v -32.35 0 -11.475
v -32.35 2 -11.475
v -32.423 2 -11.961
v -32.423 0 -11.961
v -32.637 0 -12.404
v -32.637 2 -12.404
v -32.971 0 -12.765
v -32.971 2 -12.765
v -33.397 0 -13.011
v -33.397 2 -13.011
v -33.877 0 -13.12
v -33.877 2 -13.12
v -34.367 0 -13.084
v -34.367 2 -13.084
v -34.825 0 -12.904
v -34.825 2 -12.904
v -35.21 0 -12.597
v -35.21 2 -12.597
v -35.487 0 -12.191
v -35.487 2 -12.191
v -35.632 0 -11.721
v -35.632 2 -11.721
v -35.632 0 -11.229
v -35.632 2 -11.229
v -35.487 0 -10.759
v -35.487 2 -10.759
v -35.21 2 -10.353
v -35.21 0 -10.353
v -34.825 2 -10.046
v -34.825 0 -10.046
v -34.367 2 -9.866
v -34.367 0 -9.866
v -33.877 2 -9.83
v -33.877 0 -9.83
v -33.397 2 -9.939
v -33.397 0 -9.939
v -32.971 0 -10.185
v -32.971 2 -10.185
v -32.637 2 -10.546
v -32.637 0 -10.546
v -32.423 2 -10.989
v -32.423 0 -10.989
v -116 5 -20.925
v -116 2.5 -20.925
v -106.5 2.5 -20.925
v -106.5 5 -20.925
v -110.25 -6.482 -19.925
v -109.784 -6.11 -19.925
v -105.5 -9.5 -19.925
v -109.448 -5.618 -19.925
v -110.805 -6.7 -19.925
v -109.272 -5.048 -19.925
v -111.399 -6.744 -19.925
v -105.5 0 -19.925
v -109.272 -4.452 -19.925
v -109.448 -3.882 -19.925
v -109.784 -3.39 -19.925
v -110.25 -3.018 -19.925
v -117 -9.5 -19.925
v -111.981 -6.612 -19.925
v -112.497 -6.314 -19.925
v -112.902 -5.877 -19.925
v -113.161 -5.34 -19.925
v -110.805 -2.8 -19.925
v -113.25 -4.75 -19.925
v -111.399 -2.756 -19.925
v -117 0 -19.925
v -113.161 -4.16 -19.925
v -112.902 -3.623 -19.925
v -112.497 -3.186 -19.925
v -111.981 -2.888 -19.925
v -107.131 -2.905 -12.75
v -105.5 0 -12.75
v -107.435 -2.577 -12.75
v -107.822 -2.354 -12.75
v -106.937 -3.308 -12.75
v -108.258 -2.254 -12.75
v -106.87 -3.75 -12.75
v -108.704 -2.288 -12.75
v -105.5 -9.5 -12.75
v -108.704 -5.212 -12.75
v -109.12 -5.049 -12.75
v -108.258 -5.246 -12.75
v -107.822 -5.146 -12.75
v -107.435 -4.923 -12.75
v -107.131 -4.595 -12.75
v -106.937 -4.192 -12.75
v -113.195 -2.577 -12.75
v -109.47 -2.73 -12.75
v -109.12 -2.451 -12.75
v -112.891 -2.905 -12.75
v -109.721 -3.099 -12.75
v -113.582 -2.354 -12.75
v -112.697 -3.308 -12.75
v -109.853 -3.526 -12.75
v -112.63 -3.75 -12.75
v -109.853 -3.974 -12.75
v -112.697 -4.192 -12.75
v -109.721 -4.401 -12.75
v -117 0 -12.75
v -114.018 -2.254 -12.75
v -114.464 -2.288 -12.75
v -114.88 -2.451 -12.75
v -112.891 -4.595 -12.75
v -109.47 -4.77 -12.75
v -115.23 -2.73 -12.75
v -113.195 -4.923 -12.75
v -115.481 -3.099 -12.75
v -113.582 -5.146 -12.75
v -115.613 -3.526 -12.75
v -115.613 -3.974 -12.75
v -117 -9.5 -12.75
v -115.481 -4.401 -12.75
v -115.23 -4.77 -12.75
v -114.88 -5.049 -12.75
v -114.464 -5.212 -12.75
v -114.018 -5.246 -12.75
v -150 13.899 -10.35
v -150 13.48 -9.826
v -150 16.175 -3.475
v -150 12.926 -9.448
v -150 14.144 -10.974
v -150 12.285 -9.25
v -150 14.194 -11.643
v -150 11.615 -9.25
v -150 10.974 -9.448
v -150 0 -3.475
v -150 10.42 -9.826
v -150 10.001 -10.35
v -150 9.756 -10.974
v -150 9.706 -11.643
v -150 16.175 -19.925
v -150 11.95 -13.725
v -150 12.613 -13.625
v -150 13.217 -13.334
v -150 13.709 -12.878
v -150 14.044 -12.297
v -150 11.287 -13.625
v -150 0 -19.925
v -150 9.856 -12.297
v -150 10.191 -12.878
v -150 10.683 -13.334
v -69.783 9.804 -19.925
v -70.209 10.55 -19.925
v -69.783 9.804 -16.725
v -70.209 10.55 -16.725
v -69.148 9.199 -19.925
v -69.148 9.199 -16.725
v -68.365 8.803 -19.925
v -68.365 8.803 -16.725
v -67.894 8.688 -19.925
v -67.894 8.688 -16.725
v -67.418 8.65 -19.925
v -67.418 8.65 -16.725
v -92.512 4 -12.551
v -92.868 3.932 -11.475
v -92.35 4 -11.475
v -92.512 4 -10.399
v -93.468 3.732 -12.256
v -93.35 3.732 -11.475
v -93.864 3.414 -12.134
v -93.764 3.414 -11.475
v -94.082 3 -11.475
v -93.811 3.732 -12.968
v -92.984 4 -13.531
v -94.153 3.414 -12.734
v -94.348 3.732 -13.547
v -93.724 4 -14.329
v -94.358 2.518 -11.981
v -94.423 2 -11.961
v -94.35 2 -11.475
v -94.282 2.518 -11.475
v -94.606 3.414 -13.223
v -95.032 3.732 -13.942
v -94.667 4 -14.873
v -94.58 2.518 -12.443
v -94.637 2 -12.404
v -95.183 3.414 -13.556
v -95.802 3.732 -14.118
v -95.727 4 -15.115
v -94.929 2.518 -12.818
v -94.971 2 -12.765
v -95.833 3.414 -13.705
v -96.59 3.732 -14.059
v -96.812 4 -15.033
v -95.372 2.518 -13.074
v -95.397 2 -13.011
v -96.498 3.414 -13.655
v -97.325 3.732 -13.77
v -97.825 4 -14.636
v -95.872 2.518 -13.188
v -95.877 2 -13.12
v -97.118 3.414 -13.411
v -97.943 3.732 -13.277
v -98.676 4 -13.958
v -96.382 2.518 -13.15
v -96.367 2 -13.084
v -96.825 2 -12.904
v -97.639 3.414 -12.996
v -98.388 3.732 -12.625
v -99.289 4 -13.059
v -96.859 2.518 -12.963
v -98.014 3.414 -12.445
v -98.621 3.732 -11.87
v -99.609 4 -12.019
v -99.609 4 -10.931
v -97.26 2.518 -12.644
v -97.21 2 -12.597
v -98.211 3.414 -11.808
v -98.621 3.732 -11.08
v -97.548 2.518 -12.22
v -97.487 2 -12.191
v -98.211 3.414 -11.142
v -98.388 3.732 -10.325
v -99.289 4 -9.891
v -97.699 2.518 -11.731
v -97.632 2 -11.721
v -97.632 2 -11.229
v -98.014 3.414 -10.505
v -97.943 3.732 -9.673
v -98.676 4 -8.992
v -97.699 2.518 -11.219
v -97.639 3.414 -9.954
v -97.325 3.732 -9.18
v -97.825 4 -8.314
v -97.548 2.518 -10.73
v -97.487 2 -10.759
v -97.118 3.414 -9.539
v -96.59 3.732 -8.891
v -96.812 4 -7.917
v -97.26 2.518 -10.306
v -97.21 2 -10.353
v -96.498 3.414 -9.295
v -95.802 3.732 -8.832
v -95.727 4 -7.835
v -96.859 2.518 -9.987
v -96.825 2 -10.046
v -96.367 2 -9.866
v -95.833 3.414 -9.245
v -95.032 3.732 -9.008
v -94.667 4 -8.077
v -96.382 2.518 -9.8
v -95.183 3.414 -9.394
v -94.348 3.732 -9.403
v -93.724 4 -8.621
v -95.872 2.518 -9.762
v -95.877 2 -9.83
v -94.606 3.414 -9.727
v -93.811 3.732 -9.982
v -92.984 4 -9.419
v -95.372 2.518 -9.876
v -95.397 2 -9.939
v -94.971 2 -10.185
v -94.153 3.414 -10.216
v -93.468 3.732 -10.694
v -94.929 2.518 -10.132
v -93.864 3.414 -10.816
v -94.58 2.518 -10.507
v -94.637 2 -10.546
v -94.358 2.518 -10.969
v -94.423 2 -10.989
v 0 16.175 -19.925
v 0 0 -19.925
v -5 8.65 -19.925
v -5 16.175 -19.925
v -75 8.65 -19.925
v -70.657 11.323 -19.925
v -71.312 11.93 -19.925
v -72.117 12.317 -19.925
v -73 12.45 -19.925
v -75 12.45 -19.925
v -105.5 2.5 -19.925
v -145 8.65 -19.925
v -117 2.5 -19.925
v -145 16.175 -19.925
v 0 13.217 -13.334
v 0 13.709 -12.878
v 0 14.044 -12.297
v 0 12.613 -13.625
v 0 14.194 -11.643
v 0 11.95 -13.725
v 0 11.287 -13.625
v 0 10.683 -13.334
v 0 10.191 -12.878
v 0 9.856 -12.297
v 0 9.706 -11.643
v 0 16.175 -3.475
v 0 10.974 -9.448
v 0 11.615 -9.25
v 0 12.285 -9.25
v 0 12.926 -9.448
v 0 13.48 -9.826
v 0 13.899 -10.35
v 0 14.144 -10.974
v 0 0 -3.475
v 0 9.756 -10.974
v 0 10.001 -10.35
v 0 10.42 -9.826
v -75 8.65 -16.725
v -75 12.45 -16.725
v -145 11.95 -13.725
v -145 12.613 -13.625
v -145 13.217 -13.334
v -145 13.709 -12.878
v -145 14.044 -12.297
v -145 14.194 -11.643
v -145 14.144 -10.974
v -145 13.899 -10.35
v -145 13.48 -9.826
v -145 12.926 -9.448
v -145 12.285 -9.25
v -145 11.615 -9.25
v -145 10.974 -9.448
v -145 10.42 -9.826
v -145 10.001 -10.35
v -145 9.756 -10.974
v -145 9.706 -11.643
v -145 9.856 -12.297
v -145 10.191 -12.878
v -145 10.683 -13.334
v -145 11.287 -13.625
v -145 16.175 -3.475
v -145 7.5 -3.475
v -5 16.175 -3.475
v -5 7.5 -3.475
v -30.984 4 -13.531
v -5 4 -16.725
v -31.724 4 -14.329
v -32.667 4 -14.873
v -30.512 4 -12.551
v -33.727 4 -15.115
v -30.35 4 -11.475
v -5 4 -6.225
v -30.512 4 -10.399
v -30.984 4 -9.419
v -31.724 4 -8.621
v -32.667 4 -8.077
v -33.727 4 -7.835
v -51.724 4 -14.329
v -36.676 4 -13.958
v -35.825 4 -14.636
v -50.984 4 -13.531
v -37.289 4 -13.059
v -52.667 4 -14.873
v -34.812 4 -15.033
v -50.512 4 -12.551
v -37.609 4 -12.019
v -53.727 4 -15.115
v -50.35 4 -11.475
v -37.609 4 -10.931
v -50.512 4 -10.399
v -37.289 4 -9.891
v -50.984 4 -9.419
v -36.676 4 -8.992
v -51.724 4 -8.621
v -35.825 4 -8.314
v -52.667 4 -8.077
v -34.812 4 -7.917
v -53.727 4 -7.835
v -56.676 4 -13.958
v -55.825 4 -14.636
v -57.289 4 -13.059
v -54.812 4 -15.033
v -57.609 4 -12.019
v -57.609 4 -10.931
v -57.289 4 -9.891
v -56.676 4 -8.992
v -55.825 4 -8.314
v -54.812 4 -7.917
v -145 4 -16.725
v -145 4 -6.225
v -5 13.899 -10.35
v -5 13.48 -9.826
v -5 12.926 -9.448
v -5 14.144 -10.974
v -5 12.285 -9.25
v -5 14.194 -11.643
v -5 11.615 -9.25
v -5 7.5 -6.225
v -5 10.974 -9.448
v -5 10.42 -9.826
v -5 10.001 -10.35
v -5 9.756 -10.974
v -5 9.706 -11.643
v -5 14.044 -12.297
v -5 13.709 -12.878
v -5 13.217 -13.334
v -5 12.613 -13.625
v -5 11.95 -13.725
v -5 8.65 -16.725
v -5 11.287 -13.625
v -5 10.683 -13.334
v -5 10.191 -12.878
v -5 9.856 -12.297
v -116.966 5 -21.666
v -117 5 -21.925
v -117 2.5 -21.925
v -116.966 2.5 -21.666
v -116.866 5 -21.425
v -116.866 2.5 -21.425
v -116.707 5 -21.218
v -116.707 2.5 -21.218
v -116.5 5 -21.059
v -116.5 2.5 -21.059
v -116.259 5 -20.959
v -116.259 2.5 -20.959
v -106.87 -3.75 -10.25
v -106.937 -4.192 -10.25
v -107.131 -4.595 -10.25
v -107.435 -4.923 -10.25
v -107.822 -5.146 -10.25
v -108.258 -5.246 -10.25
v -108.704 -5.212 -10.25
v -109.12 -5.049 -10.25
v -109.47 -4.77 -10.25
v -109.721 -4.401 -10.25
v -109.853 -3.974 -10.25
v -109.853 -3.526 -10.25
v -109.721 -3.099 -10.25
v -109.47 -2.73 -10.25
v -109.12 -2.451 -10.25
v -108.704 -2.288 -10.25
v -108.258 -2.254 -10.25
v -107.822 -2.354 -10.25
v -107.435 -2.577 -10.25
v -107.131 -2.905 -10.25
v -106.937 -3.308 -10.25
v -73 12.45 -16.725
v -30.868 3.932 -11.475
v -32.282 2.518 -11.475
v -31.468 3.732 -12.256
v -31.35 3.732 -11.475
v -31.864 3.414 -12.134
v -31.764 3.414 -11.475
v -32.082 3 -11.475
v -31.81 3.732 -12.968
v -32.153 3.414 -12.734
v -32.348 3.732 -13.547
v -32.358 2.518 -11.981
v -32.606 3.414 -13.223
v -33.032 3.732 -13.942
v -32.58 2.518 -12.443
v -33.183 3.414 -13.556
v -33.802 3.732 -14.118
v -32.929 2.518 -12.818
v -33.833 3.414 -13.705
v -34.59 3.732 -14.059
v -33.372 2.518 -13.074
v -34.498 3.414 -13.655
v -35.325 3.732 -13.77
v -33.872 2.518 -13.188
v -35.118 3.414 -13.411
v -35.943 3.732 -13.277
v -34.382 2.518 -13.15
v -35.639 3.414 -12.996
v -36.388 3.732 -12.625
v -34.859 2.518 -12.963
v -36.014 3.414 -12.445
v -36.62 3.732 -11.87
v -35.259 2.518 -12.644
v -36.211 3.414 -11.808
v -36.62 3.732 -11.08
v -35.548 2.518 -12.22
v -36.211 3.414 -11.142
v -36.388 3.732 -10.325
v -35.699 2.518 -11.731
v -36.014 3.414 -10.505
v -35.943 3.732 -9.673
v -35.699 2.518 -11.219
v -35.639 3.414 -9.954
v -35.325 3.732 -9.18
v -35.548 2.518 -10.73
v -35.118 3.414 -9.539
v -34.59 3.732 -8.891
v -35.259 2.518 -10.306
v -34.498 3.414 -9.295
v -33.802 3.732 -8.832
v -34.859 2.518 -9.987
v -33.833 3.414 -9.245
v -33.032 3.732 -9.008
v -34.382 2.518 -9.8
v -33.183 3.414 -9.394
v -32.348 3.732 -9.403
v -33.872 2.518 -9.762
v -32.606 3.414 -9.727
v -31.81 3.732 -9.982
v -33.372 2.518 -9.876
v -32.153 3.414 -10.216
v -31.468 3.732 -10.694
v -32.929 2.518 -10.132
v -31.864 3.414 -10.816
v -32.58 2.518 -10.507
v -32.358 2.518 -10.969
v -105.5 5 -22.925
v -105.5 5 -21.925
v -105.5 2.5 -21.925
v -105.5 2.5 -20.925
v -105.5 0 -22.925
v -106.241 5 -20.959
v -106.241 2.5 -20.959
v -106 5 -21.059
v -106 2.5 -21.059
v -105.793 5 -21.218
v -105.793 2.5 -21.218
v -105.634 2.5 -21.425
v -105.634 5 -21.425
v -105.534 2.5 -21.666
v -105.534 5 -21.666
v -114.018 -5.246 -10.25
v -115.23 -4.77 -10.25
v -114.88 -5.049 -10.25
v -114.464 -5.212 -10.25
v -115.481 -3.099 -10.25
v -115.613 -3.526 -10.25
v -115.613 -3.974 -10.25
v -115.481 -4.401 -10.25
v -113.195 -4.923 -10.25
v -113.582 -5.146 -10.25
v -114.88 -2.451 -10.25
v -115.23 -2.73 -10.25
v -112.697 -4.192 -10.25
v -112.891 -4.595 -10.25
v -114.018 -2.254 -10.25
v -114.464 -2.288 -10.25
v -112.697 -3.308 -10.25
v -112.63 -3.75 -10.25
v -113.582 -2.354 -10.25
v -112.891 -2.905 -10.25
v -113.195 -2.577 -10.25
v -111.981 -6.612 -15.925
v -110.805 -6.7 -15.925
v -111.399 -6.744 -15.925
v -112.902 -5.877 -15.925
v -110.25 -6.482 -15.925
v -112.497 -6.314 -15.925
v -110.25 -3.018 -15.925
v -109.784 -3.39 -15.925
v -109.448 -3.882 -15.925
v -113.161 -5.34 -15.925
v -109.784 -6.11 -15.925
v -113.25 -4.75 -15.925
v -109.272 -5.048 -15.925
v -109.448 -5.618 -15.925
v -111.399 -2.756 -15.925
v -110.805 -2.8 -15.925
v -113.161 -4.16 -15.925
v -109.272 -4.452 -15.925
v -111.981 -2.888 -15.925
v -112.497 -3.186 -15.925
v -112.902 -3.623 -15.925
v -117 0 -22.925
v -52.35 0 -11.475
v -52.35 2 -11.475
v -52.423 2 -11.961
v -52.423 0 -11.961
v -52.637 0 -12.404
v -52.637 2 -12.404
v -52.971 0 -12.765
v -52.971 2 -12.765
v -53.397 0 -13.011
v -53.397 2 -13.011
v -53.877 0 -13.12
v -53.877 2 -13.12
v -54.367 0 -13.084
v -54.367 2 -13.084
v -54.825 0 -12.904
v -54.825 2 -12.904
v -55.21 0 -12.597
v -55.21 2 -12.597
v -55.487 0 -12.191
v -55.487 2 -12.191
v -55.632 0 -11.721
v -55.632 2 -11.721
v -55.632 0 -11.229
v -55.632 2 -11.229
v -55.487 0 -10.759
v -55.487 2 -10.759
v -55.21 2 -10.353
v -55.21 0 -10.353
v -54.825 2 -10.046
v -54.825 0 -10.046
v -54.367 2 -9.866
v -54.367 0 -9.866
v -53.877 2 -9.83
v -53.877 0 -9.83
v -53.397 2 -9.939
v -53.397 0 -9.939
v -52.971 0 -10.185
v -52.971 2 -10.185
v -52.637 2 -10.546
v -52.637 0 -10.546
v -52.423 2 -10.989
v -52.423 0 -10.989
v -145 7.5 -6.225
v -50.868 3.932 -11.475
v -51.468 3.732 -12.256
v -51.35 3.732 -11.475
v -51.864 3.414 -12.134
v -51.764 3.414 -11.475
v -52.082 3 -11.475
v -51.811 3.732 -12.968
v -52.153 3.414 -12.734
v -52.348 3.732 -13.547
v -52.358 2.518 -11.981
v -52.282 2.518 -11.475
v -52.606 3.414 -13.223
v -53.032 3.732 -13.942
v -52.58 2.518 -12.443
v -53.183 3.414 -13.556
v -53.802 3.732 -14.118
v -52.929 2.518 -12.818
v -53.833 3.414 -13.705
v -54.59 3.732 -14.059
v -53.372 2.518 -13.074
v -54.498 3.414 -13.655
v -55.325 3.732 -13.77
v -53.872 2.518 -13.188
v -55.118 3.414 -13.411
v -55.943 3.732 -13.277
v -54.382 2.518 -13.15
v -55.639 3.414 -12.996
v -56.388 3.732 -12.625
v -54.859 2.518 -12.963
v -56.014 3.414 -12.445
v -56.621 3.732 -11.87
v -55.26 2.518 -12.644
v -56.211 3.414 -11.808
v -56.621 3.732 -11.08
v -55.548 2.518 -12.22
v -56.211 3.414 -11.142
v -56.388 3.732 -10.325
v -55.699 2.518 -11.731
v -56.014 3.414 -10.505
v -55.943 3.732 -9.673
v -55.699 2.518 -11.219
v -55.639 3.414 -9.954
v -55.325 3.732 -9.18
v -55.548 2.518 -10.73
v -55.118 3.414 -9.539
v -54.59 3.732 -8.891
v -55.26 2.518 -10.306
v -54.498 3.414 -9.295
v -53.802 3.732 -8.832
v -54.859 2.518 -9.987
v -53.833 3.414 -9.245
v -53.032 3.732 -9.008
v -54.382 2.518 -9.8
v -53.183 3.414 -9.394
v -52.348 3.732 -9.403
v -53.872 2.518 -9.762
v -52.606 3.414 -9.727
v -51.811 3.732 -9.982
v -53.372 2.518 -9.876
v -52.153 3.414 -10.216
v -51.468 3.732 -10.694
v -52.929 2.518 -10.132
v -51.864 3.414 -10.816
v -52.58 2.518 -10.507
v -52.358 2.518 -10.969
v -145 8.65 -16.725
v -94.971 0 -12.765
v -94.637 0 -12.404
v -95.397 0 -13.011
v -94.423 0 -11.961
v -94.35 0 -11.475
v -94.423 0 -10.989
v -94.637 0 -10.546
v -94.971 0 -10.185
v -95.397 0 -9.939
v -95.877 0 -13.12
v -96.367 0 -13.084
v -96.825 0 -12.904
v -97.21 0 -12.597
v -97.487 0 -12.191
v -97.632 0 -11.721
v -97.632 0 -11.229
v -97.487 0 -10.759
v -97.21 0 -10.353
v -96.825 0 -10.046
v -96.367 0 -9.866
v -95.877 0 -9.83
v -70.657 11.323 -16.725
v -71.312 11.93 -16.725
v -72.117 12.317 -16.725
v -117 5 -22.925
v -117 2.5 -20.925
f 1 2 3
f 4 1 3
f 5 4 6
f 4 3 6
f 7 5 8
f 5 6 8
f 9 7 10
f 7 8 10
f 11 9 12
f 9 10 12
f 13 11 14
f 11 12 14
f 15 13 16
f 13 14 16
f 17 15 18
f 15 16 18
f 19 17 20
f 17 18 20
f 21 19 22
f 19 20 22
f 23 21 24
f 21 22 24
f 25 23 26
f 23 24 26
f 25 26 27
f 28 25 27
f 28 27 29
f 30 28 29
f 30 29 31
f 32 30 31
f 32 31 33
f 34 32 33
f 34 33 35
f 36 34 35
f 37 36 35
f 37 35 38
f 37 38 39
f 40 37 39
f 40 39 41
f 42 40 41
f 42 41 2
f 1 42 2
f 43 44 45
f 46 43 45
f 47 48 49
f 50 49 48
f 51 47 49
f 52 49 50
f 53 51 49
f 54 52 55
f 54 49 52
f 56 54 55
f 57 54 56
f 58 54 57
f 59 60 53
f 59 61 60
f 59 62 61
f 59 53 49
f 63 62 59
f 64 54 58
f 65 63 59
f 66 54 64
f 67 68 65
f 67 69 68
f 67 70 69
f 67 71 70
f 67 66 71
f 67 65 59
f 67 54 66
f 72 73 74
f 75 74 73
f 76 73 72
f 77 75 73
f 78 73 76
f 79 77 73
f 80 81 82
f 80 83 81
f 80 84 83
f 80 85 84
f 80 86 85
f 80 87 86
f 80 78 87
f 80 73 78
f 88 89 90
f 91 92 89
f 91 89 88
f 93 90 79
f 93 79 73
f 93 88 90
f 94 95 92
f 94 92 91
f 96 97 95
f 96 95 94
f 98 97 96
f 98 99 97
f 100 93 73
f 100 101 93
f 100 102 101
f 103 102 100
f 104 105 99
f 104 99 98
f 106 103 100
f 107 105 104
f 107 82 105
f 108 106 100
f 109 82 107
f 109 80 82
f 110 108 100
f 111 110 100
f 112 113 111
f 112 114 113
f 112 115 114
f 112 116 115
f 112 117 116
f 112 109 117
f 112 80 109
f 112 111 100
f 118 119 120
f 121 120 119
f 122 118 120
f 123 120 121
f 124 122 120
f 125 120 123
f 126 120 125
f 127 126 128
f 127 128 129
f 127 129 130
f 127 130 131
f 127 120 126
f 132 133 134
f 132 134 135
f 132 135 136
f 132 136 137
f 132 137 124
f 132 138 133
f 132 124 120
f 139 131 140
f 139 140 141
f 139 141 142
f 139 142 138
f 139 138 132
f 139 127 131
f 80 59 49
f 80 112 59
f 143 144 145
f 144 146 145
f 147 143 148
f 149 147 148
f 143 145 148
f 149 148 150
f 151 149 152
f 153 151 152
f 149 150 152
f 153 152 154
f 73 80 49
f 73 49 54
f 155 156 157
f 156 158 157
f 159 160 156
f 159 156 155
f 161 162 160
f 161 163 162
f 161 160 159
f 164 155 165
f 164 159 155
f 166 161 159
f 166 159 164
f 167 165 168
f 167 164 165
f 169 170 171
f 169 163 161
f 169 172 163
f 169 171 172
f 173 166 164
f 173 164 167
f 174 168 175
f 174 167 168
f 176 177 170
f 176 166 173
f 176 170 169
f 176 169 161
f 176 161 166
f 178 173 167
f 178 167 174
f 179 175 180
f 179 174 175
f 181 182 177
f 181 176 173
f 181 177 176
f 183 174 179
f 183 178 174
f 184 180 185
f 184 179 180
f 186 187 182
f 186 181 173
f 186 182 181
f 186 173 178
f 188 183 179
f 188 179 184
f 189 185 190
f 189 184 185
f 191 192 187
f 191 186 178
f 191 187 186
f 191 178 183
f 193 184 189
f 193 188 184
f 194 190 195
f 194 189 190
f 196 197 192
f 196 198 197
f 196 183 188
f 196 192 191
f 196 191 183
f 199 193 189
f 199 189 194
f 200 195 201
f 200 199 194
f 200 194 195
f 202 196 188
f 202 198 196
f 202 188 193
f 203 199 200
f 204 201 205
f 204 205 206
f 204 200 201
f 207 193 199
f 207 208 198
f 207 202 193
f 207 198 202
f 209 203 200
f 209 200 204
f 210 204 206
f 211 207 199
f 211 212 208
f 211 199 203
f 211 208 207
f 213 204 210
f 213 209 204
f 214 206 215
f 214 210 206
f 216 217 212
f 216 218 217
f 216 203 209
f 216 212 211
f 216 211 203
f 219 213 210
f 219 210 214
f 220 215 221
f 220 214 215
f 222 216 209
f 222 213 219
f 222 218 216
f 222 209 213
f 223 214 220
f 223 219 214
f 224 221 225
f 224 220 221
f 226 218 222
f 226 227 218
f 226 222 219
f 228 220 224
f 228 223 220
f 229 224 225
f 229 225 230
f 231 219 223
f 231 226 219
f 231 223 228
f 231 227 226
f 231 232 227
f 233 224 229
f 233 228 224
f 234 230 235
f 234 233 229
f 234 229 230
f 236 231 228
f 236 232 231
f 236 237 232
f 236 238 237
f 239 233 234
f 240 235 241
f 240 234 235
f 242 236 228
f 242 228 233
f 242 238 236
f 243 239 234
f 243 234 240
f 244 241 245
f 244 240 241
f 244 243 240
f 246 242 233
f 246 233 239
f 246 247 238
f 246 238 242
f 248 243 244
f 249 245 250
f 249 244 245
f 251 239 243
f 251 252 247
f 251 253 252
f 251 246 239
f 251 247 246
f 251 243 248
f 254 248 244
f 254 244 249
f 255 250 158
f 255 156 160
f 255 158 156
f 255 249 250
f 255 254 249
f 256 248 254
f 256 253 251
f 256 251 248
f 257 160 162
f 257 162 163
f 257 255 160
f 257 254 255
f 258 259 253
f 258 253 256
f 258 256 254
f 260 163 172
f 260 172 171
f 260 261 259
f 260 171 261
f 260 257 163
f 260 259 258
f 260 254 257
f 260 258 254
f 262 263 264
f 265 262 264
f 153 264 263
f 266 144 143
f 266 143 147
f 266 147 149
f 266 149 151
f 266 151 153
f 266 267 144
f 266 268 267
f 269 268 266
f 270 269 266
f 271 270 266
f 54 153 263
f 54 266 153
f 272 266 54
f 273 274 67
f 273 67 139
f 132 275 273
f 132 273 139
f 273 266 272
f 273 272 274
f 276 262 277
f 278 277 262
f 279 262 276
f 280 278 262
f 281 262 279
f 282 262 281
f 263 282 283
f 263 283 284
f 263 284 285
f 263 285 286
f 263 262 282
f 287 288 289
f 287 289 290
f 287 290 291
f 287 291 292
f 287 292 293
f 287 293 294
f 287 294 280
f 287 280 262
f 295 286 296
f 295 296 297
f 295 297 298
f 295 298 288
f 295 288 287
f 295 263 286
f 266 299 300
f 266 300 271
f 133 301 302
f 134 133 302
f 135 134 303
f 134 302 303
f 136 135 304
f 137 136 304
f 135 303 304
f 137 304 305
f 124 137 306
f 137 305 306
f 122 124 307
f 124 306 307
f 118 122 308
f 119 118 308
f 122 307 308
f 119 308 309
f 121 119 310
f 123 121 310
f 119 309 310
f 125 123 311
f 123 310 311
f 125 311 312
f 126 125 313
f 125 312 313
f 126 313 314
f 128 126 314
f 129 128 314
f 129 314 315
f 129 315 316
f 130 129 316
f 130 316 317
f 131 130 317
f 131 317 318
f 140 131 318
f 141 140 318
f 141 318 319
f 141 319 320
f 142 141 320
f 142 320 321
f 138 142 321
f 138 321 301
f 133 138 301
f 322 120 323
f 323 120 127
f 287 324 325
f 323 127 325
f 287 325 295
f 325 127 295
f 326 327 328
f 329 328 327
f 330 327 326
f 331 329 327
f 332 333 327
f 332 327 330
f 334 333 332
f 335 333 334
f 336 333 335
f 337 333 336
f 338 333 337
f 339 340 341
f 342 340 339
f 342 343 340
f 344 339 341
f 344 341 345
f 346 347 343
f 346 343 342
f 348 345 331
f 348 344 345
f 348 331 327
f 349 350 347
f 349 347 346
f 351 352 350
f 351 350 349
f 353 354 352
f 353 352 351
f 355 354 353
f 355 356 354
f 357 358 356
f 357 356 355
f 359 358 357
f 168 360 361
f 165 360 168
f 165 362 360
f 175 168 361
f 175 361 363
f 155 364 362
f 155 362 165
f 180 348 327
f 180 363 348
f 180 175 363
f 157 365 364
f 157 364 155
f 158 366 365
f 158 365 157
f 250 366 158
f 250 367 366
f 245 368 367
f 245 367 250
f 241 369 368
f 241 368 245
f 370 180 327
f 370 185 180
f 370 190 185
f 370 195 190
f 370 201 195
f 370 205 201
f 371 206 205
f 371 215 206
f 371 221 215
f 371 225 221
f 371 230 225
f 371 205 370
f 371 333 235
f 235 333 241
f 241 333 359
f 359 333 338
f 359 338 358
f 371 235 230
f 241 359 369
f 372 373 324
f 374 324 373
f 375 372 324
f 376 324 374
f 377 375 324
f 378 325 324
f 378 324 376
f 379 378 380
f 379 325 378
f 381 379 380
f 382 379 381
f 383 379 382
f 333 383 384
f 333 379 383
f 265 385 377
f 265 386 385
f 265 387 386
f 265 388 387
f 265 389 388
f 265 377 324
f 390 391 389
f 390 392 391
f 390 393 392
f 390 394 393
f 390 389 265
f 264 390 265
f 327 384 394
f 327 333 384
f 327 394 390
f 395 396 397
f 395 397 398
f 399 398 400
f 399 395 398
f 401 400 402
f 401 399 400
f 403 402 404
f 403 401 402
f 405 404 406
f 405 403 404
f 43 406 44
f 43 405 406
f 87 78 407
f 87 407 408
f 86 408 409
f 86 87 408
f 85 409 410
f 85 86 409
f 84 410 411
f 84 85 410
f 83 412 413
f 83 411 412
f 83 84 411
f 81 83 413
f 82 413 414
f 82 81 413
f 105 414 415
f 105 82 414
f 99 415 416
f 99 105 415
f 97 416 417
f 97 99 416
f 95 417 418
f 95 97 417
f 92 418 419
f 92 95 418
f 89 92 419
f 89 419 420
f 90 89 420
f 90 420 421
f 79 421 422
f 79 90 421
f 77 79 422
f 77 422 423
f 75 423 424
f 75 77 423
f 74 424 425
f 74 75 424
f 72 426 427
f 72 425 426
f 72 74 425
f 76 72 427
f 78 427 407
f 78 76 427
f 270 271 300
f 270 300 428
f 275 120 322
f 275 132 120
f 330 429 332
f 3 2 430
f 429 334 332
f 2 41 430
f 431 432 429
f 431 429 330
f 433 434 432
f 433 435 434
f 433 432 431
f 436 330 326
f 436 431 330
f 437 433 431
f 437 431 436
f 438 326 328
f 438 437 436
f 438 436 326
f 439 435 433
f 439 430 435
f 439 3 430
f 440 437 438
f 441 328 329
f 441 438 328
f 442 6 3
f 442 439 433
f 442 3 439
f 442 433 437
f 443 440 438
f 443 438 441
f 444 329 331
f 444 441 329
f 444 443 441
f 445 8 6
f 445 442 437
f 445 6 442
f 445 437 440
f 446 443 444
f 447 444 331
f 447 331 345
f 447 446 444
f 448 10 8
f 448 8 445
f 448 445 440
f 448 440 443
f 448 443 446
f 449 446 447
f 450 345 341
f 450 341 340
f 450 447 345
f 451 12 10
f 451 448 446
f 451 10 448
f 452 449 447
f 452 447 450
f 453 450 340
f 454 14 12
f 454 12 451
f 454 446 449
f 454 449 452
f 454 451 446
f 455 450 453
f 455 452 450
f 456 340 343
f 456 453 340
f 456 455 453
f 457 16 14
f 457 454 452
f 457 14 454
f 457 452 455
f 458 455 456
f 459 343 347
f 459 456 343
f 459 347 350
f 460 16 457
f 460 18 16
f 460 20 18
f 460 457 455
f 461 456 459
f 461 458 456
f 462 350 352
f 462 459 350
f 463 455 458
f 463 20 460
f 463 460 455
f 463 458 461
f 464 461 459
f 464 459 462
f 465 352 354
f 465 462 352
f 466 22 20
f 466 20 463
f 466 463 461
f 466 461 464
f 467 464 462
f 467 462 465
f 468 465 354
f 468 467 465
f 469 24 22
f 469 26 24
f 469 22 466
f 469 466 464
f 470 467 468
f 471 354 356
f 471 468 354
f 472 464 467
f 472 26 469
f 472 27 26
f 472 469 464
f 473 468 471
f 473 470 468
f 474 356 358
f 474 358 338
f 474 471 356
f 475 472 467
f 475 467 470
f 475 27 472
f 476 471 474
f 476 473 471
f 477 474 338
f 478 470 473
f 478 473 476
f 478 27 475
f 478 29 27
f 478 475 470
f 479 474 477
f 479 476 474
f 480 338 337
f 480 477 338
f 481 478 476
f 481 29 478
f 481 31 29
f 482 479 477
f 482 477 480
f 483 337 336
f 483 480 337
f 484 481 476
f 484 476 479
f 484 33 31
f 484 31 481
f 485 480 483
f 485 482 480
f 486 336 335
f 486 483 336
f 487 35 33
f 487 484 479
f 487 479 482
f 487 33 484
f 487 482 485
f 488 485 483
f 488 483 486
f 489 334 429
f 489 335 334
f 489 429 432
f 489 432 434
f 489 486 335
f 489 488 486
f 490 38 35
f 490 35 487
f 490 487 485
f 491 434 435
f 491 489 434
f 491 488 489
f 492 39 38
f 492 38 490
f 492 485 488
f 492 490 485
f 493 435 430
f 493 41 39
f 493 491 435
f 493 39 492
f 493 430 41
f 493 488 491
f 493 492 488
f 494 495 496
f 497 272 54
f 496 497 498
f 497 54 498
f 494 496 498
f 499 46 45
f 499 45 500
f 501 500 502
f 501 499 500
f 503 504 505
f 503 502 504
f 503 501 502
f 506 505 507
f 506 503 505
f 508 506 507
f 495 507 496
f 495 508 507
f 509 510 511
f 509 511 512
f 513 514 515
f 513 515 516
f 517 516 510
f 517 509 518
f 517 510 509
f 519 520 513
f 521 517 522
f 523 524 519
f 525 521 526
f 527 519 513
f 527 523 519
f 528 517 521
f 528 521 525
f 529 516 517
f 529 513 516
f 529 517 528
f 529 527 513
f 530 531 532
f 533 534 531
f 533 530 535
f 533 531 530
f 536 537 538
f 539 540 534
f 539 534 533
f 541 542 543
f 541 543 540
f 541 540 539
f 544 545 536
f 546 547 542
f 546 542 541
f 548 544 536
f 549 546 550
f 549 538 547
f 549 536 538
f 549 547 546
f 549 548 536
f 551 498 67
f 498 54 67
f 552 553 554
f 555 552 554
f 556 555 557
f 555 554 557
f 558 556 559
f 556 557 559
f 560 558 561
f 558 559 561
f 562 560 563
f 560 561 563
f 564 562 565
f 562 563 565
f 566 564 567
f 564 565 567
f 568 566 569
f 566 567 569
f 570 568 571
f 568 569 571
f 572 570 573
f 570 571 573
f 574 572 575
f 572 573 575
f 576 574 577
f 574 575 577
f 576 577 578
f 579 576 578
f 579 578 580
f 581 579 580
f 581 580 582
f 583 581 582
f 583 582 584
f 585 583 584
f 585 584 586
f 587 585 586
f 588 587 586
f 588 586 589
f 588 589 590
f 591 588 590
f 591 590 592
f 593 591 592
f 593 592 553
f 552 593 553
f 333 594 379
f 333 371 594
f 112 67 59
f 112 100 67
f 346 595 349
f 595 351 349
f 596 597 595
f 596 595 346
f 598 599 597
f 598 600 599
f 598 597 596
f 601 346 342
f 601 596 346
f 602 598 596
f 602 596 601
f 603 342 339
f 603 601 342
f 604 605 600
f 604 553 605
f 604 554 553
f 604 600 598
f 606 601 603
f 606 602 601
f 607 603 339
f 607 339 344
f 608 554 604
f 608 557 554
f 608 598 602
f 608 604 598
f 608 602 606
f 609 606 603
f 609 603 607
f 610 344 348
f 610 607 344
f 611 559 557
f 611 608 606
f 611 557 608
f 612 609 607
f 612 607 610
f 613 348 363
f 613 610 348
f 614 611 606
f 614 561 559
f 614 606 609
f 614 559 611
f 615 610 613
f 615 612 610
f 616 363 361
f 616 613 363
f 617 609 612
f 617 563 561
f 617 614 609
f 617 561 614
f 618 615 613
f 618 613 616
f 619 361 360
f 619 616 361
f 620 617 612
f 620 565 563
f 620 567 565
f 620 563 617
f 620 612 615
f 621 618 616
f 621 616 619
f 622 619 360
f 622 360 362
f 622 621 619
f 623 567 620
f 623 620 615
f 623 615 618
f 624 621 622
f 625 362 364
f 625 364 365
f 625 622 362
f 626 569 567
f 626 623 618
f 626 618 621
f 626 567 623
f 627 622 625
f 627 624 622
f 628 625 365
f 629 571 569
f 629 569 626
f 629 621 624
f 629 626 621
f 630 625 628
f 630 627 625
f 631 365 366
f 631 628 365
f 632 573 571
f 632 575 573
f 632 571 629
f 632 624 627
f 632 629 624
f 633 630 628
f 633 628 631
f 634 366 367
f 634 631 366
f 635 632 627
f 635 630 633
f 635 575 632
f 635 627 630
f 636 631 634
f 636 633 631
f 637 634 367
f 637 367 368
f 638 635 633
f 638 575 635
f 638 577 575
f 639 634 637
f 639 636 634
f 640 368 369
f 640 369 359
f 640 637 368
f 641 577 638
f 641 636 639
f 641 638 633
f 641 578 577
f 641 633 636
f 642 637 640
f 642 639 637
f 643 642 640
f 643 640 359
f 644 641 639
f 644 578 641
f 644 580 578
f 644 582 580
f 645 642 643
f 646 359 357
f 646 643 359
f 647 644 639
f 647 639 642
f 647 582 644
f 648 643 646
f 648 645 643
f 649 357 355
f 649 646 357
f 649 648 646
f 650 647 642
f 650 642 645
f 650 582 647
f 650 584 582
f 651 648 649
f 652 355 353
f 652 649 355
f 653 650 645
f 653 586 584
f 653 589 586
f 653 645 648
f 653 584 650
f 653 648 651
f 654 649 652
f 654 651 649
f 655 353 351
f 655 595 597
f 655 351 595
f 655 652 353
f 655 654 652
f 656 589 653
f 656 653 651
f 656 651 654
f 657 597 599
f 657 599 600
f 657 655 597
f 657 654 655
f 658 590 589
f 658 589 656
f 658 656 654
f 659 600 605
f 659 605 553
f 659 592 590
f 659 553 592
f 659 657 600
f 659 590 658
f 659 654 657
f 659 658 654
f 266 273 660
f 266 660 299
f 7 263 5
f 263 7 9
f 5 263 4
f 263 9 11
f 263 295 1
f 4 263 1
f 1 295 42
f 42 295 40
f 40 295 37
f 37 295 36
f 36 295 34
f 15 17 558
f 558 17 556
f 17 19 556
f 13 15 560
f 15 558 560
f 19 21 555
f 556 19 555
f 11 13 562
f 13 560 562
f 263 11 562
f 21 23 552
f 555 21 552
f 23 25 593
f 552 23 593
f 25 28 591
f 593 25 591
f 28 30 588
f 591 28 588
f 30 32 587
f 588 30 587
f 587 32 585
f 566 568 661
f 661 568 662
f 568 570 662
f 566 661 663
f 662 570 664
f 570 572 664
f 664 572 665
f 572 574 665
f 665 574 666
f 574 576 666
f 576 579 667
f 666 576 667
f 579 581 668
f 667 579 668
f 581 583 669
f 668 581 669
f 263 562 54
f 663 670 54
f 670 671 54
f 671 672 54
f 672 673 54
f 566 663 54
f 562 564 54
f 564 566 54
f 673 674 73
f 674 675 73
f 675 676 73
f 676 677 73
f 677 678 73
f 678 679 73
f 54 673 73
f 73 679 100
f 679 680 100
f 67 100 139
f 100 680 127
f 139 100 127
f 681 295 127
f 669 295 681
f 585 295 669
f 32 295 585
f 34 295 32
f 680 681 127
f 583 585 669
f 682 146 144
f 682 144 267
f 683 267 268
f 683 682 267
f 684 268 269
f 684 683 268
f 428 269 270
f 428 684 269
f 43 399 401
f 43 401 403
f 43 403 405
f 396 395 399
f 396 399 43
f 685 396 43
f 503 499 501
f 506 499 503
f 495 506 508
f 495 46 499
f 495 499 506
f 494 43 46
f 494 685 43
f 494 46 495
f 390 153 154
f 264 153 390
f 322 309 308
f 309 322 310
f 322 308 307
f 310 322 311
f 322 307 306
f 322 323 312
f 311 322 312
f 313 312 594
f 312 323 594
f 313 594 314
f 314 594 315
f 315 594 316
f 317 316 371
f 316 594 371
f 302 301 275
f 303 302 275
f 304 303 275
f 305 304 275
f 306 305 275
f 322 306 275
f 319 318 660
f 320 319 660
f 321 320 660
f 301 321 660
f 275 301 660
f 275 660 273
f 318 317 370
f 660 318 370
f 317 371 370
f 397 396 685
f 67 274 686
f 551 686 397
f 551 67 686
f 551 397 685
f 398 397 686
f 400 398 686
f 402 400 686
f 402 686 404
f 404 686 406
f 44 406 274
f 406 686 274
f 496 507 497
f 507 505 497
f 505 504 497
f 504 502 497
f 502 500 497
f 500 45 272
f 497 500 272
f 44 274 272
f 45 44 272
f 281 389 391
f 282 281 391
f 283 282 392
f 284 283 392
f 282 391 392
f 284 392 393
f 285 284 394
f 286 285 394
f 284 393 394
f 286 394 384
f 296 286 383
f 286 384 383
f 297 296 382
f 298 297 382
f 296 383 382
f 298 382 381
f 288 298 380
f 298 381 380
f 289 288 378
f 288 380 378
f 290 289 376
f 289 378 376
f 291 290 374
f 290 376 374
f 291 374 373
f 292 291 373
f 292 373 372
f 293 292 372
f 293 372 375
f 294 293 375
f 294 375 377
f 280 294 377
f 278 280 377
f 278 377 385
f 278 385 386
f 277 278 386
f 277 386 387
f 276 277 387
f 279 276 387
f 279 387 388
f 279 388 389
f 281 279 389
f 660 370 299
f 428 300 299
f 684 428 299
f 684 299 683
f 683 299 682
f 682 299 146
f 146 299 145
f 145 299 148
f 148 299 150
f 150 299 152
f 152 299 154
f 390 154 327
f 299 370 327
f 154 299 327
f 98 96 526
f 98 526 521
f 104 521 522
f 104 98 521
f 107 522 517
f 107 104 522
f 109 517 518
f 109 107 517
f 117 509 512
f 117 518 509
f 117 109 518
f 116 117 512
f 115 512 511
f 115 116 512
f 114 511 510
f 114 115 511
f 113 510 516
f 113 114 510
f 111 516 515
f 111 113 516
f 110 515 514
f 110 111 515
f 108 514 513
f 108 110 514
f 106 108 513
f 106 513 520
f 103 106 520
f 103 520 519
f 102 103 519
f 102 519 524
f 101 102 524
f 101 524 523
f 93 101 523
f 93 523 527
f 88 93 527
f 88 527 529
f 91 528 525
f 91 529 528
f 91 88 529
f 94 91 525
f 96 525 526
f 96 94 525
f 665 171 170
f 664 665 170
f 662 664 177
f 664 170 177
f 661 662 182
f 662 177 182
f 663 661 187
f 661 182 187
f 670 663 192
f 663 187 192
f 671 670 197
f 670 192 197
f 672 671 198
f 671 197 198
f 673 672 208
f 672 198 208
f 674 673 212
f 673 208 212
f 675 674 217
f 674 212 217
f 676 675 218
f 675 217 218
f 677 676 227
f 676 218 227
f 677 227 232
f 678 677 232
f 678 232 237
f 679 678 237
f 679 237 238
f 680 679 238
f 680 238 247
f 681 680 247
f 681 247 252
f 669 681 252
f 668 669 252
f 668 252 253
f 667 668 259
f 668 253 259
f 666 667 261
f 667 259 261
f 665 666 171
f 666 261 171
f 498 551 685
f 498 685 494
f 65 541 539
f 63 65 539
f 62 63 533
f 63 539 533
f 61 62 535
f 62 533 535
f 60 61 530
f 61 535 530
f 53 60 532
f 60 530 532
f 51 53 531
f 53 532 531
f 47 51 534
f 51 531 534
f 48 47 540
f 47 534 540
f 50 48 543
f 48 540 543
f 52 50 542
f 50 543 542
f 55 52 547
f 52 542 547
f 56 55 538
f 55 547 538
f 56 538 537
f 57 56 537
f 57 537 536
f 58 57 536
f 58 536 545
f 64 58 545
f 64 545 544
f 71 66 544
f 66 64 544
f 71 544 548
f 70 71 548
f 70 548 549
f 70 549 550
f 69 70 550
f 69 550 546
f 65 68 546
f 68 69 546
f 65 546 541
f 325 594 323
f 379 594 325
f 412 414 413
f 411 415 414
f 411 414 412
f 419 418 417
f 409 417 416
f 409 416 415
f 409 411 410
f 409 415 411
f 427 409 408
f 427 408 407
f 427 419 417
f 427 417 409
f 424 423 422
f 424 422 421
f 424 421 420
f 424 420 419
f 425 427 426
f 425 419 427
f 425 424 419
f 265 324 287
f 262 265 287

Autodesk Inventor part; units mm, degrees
ref_plane "YZ Plane" through (0, 0, 0) normal (1, 0, 0) x (0, 1, 0)
ref_plane "XZ Plane" through (0, 0, 0) normal (0, 1, 0) x (-1, 0, 0)
ref_plane "XY Plane" through (0, 0, 0) normal (0, 0, 1) x (1, 0, 0)
sketch "Sketch1" plane through (0, 0, 0) normal (0, 1, 0) x (-1, 0, 0)
  line L0 (0, 0) -> (150, 0)
  line L1 (150, 0) -> (150, -19.925)
  line L2 (150, -19.925) -> (0, -19.925)
  line L3 (0, -19.925) -> (0, 0)
  dimension "d0" = 150
  dimension "d1" = 19.925
extrude "Extrusion1" add sketch "Sketch1" along normal blind 4
sketch "Sketch2" plane through (0, 4, 0) normal (0, 1, 0) x (1, 0, 0)
  line L0 (-150, 0) -> (0, 0) projected
  line L1 (0, 19.925) -> (-150, 19.925) projected
  line L2 (0, 0) -> (-5, 0)
  line L3 (-5, 0) -> (-5, 19.925)
  line L4 (-5, 19.925) -> (0, 19.925)
  line L5 (0, 19.925) -> (0, 0)
  line L6 (-150.0001, 0) -> (-145.0001, 0)
  line L7 (-145.0001, 0) -> (-145.0001, 19.925)
  line L8 (-145.0001, 19.925) -> (-150.0001, 19.925)
  line L9 (-150.0001, 19.925) -> (-150.0001, 0)
  dimension "d4" = 5
  dimension "d5" = 5
extrude "Extrusion2" add sketch "Sketch2" along normal blind 12.175 contours L9 L1 L7 L0 | L3 L1 L5 L0
sketch "Sketch3" plane through (0, 4, 0) normal (0, 1, 0) x (1, 0, 0)
  line L0 (0, 19.925) -> (0, 0) projected
  line L1 (-150, 0) -> (-150, 19.925) projected
  line L2 (0, 19.925) -> (-150, 19.925)
  line L3 (-150, 19.925) -> (-150, 16.725)
  line L4 (-150, 16.725) -> (0, 16.725)
  line L5 (0, 16.725) -> (0, 19.925)
  dimension "d8" = 3.2
extrude "Extrusion3" add sketch "Sketch3" along normal blind 4.65
sketch "Sketch4" plane through (0, 4, 0) normal (0, 1, 0) x (1, 0, 0)
  line L0 (-5, 16.725) -> (-145.0001, 16.725) construction
  line L1 (-145.0001, 0) -> (-145.0001, 19.925) construction
  line L2 (-5, 16.725) -> (-145.0001, 16.725) construction
  line L3 (-145.0001, 16.725) -> (-145.0001, 6.225) construction
  line L4 (-145.0001, 6.225) -> (-5, 6.225) construction
  line L5 (-5, 6.225) -> (-5, 16.725) construction
  line L6 (-5, 19.925) -> (-5, 0) projected
  line L7 (-145.0001, 6.225) -> (-5, 6.225)
  line L8 (-5, 6.225) -> (-5, 3.475)
  line L9 (-5, 3.475) -> (-145.0001, 3.475)
  line L10 (-145.0001, 3.475) -> (-145.0001, 6.225)
  point P0 (0, 0)
  dimension "d11" = 10.5
  dimension "d12" = 2.75
extrude "Extrusion4" add sketch "Sketch4" along normal blind 3.5
sketch "Sketch5" plane through (-145.0001, 4, 0) normal (1, 0, 0) x (0, 0, -1)
  point P0 (0, -4)
sketch "Sketch6" plane through (-145.0001, 4, 0) normal (1, 0, 0) x (0, 0, -1)
  line L0 (6.225, 0) -> (16.725, 0) construction
  line L1 (16.725, 0) -> (16.725, -7.95) construction
  line L2 (16.725, -7.95) -> (6.225, -7.95) construction
  line L3 (6.225, -7.95) -> (6.225, 0) construction
  line L4 (6.225, 0) -> (16.725, 0) construction
  line L5 (16.725, 0) -> (16.725, 7.95) construction
  line L6 (16.725, 7.95) -> (6.225, 7.95) construction
  line L7 (6.225, 7.95) -> (6.225, 0) construction
  circle A0 centre (11.475, 7.95) radius 2.25
  point P0 (0, -4)
  dimension "d15" = 7.95
  dimension "d16" = 7.95
  dimension "d17" = 4.5
extrude "Extrusion5" cut sketch "Sketch6" along normal blind 155.75 and the other way blind 5.75
sketch "Sketch7" plane through (0, 4, 0) normal (0, 1, 0) x (1, 0, 0)
  line L0 (-145.0001, 3.475) -> (-145.0001, 0) projected
  line L1 (-145.0001, 3.475) -> (1.5965, 3.475)
  line L2 (1.5965, 3.475) -> (1.5965, -1.1679)
  line L3 (1.5965, -1.1679) -> (-145.0001, -1.1679)
  line L4 (-145.0001, -1.1679) -> (-145.0001, 3.475)
  line L5 (-145.0001, 3.475) -> (-5, 3.475) projected
  line L6 (-145.0001, 3.475) -> (-155.2913, 3.475)
  line L7 (-155.2913, 3.475) -> (-155.2913, -7.4286)
  line L8 (-155.2913, -7.4286) -> (-145.0001, -7.4286)
  line L9 (-145.0001, -7.4286) -> (-145.0001, 3.475)
  point P0 (0, 0)
extrude "Extrusion6" cut sketch "Sketch7" along normal blind 21 and the other way blind 34.875
sketch "Sketch8" plane through (0, 8.65, 0) normal (0, 1, 0) x (1, 0, 0)
  line L0 (-145.0001, 16.725) -> (-145.0001, 19.925) construction
  line L1 (-5, 16.725) -> (-145.0001, 16.725) construction
  line L2 (-145.0001, 19.925) -> (-5, 19.925) construction
  line L3 (-5, 19.925) -> (-5, 16.725) construction
  line L4 (-5, 16.725) -> (-145.0001, 16.725) construction
  line L5 (-145.0001, 16.725) -> (-145.0001, 19.925) construction
  line L6 (-150, 19.925) -> (0, 19.925) projected
  line L7 (-75, 19.925) -> (-70, 19.925)
  line L8 (-70, 19.925) -> (-70, 16.725)
  line L9 (-70, 16.725) -> (-75, 16.725)
  line L10 (-75, 16.725) -> (-75, 19.925)
  point P0 (0, 0)
  dimension "d26" = 5
extrude "Extrusion7" add sketch "Sketch8" along normal blind 3.8
fillet "Fillet1" radius 3 1 edges at (-70, 12.45, -18.325)
fillet "Fillet2" radius 3 1 edges at (-70, 8.65, -18.325)
sketch "Sketch9" plane through (0, 4, 0) normal (0, 1, 0) x (1, 0, 0)
  line L0 (-145.0001, 13.725) -> (-145.0001, 9.225) construction
  line L1 (-5, 9.225) -> (-5, 13.725) construction
  line L2 (-75.0001, 11.475) -> (-96.0001, 11.475) construction
  circle A0 centre (-96.0001, 11.475) radius 1.65
  line L3 (-75.0001, 11.475) -> (-54.0001, 11.475) construction
  circle A1 centre (-54.0001, 11.475) radius 1.65
  point P0 (0, 0)
  dimension "d33" = 21
  dimension "d34" = 3.3
  dimension "d35" = 21
  dimension "d36" = 3.3
extrude "Extrusion8" cut sketch "Sketch9" against normal blind 4
sketch "Sketch10" plane through (0, 4, 0) normal (0, 1, 0) x (1, 0, 0)
  circle A0 centre (-34, 11.475) radius 1.65 construction
  circle A1 centre (-34, 11.475) radius 1.65
  point P0 (0, 0)
  dimension "d39" = 3.3
extrude "Extrusion9" cut sketch "Sketch10" against normal blind 4
fillet "Fillet3" radius 2 3 edges at (-55.6501, 4, -11.475) (-35.65, 4, -11.475) (-97.6501, 4, -11.475)
sketch "Sketch11" plane through (0, 0, 0) normal (0, -1, 0) x (1, 0, 0)
  circle A0 centre (-96.0001, -11.475) radius 1.65 construction
  line L0 (-96.0001, -11.475) -> (-105.5001, -11.475) construction
  line L1 (-105.5, -8.75) -> (-105.5, -13.75)
  line L2 (-105.5, -13.75) -> (-117, -13.75)
  line L3 (-117, -13.75) -> (-117, -8.75)
  line L4 (-117, -8.75) -> (-105.5, -8.75)
  point P0 (0, 0)
  dimension "d43" = 9.5
  dimension "d44" = 5
  dimension "d45" = 11.5
extrude "Extrusion10" add sketch "Sketch11" along normal blind 9.5
sketch "Sketch12" plane through (-105.5, 0, -13.75) normal (0, 0, -1) x (-1, 0, 0)
  line L0 (0, -9.5) -> (11.5, -9.5) construction
  line L1 (0, 0) -> (11.5, 0) construction
  line L2 (11.5, -9.5) -> (0, 0) construction
  line L3 (0, 0) -> (0, -9.5) construction
  line L4 (0, -9.5) -> (11.5, 0) construction
  circle A0 centre (5.75, -4.75) radius 2
  line L5 (11.5, -9.5) -> (0, -9.5)
  line L6 (0, -9.5) -> (0, 0)
  line L7 (0, 0) -> (11.5, 0)
  line L8 (11.5, 0) -> (11.5, -9.5)
  point P0 (-105.5, 0)
  dimension "d48" = 4
sketch "Sketch13" plane through (-105.5, 0, -13.75) normal (0, 0, -1) x (-1, 0, 0)
  point P0 (-105.5, 0)
extrude "Extrusion11" add sketch "Sketch12" along normal blind 6.175
sketch "Sketch14" plane through (-111.25, -4.75, -13.75) normal (0, 0, -1) x (-1, 0, 0)
  circle A0 centre (0, 0) radius 2
  point P0 (-111.25, 4.75)
extrude "Extrusion12" cut sketch "Sketch14" against normal blind 1.825
sketch "Sketch15" plane through (-111.25, -4.75, -11.925) normal (0, 0, -1) x (-1, 0, 0)
  circle A0 centre (0, 0) radius 2
  point P0 (-111.25, 4.75)
extrude "Extrusion13" cut sketch "Sketch15" against normal blind 0.5
sketch "Sketch16" plane through (-105.5, 0, -19.925) normal (0, 0, -1) x (-1, 0, 0)
  point P0 (-105.5, 0)
sketch "Sketch17" plane through (0, 0, 0) normal (0, -1, 0) x (1, 0, 0)
  point P0 (0, 0)
sketch "Sketch18" plane through (-111.25, -4.75, -11.425) normal (0, 0, -1) x (-1, 0, 0)
  circle A0 centre (0, 0) radius 2 projected
  circle A1 centre (0, 0) radius 2
  point P0 (-111.25, 4.75)
extrude "Extrusion14" add sketch "Sketch18" along normal blind 4.5
sketch "Sketch19" plane through (0, -9.5, 0) normal (0, -1, 0) x (1, 0, 0)
  line L0 (-105.5, -8.75) -> (-117, -8.75) projected
  line L1 (-105.5, -8.75) -> (-105.5, -19.925) projected
  line L2 (-117, -8.75) -> (-105.5, -8.75)
  line L3 (-105.5, -8.75) -> (-105.5, -12.75)
  line L4 (-105.5, -12.75) -> (-117, -12.75)
  line L5 (-117, -12.75) -> (-117, -8.75)
  point P0 (0, 0)
  dimension "d57" = 4
extrude "Extrusion15" cut sketch "Sketch19" against normal blind 9.5
sketch "Sketch20" plane through (-117, -9.5, -12.75) normal (0, 0, 1) x (1, 0, 0)
  line L0 (11.5, 9.5) -> (11.5, 0) construction
  line L1 (0, 0) -> (0, 9.5) construction
  line L2 (11.5, 9.5) -> (0, 9.5) construction
  line L3 (0, 9.5) -> (0, 2) construction
  line L4 (0, 2) -> (11.5, 2) construction
  line L5 (11.5, 2) -> (11.5, 9.5) construction
  line L6 (-33, 9.5) -> (0, 9.5) construction
  line L7 (11.5, 2) -> (0, 9.5) construction
  line L8 (0, 9.5) -> (0, 2) construction
  line L9 (11.5, 9.5) -> (0, 2) construction
  line L10 (5.75, 5.75) -> (2.87, 5.75) construction
  line L11 (5.75, 5.75) -> (8.63, 5.75) construction
  circle A0 centre (8.63, 5.75) radius 1.5
  circle A1 centre (2.87, 5.75) radius 1.5
  point P0 (117, 9.5)
  dimension "d60" = 7.5
  dimension "d61" = 2.88
  dimension "d62" = 2.88
  dimension "d63" = 3
  dimension "d64" = 3
extrude "Extrusion16" add sketch "Sketch20" along normal blind 2.5
sketch "Sketch21" plane through (0, 16.175, -19.925) normal (0, 0, -1) x (-1, 0, 0)
  line L0 (0, -16.175) -> (150, -16.175) projected
  line L1 (105.5, -16.175) -> (117, -16.175)
  line L2 (117, -16.175) -> (117, -13.675)
  line L3 (117, -13.675) -> (105.5, -13.675)
  line L4 (105.5, -13.675) -> (105.5, -16.175)
  dimension "d67" = 2.5
extrude "Extrusion17" add sketch "Sketch21" along normal blind 3
sketch "Sketch22" plane through (-117, 2.5, -19.925) normal (0, 1, 0) x (1, 0, 0)
  line L0 (0, 3) -> (11.5, 3) projected
  line L1 (0, 0) -> (0, 3) projected
  line L2 (11.5, 3) -> (0, 3)
  line L3 (0, 3) -> (0, 1)
  line L4 (0, 1) -> (11.5, 1)
  line L5 (11.5, 1) -> (11.5, 3)
  point P0 (117, -19.925)
  dimension "d70" = 2
extrude "Extrusion18" add sketch "Sketch22" along normal blind 2.5
fillet "Fillet4" radius 1 2 edges at (-117, 3.75, -20.925) (-105.5, 3.75, -20.925)
equation "\"BendRadius\" = Thickness"
equation "\"BendReliefWidth\" = Thickness"
equation "\"BendReliefDepth\" = 0.5 * Thickness"
equation "\"CornerReliefSize\" = 4 * Thickness"
equation "\"MinimumRemnant\" = 2 * Thickness"
equation "\"TransitionRadius\" = BendRadius"
equation "\"JacobiRadiusSize\" = BendRadius"
equation "\"GapSize\" = Thickness"
equation "\"Thickness\" = 0.5"
properties part number "mtv_axelHolder(brakingAxel)3-12"
